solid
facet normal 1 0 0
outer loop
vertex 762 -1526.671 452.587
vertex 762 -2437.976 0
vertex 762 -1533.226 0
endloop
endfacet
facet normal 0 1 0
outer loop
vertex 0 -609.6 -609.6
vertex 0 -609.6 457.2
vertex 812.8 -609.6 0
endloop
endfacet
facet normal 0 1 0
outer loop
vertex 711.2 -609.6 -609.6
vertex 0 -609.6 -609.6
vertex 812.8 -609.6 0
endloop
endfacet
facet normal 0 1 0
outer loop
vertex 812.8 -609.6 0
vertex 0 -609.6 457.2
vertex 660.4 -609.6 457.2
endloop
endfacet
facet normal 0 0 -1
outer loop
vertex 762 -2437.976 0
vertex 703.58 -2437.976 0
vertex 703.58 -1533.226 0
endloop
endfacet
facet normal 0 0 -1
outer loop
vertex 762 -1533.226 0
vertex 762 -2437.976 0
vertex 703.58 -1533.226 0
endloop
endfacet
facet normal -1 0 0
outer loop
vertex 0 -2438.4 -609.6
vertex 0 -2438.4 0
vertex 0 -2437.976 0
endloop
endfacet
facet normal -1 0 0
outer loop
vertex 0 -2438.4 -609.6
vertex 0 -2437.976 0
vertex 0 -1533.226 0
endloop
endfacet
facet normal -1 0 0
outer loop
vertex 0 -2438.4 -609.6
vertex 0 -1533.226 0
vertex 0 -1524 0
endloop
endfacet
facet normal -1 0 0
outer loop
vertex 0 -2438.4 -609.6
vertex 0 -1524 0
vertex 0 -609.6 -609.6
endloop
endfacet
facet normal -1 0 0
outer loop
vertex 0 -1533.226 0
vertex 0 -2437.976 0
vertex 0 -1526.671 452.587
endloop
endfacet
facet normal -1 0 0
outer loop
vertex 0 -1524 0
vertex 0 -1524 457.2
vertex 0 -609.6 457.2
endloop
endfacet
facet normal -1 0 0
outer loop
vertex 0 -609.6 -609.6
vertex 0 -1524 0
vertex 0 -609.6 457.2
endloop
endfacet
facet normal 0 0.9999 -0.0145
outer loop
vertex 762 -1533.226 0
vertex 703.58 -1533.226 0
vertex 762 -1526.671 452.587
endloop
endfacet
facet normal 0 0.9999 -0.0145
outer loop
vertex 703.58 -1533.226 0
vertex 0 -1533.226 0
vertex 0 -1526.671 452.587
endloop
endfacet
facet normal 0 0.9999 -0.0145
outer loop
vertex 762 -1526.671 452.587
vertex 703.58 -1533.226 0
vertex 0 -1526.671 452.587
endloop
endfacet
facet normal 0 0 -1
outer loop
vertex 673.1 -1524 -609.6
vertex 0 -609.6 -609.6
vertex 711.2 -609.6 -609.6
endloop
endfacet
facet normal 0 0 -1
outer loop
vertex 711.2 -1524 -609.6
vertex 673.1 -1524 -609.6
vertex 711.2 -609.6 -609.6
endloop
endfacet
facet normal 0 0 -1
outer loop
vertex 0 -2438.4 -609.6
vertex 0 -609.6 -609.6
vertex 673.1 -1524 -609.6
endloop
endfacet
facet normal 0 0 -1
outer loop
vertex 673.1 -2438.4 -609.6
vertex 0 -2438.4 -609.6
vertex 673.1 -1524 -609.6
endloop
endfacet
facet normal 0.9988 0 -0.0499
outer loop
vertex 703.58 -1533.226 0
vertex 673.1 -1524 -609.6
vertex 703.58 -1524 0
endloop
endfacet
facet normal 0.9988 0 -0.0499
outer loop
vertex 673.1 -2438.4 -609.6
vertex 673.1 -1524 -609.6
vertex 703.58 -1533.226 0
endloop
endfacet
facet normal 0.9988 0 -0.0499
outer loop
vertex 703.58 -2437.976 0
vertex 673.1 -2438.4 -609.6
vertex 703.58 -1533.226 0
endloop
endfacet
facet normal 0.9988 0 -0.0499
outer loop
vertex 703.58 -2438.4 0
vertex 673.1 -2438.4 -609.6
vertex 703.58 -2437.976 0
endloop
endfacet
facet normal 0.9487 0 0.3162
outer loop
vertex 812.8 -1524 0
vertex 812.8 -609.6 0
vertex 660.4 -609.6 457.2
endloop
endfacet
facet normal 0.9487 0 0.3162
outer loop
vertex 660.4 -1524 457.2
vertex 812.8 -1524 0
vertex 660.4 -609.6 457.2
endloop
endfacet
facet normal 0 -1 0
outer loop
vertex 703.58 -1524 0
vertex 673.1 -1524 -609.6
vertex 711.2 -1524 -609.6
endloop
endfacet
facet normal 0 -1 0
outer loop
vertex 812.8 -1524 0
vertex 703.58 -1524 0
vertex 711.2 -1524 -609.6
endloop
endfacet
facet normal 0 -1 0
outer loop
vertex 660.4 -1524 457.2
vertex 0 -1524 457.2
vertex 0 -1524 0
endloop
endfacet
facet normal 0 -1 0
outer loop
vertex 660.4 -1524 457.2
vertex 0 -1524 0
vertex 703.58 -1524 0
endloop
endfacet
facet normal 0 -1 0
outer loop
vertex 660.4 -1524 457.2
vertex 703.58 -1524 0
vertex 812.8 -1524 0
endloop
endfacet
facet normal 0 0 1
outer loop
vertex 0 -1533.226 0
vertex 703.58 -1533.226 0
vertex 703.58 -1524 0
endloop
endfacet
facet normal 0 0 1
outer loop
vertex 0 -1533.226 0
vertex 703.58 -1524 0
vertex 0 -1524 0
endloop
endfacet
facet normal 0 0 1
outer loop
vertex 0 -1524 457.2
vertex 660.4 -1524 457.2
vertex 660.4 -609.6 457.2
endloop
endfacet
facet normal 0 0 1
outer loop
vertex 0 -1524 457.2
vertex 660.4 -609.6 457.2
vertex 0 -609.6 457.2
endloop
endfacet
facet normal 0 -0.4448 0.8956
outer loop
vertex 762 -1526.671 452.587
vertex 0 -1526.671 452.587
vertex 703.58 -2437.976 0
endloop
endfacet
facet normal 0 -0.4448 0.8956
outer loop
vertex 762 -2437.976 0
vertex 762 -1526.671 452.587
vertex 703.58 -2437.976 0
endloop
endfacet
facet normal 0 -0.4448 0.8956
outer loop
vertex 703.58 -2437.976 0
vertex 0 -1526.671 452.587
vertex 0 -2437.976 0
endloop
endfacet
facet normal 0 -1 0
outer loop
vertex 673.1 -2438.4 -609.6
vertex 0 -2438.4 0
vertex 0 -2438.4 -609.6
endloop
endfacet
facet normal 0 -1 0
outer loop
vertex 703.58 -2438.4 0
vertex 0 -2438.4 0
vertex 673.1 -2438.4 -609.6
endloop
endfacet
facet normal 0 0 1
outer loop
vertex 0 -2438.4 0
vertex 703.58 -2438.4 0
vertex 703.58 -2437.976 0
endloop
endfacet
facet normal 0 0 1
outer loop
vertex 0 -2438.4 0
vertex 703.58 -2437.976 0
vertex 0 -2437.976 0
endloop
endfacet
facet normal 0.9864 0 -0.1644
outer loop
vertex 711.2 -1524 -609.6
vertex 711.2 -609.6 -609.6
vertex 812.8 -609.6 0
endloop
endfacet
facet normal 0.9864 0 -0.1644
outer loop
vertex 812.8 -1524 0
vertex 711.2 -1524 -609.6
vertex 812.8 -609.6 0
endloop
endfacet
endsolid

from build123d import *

# Parameters (mm, degrees)
F12_DEPTH = 914.4
F13_DEPTH = 914.4
F14_DEPTH = 762
F15_DEPTH = 914.4


with BuildPart() as f12:
    # F8 (on offset) → F12 (new body, through all)
    with BuildSketch(Plane.XZ.offset(2438.4)):
        Polygon((673.1, -609.6), (703.58, 0), (0, 0), (0, -609.6), align=None)
    extrude(amount=-F12_DEPTH)

    # F10 (on offset) → F13 (join, through all)
    with BuildSketch(Plane.XZ.offset(1524)):
        Polygon((0, 457.2), (0, 0), (673.1, 0), (584.2, 457.2), align=None)
        Polygon((673.1, 0), (0, 0), (0, -609.6), (609.6, -609.6), align=None)
    extrude(amount=-F13_DEPTH)

    # F11 (on Right) → F14 (join)
    with BuildSketch(Plane.YZ):
        Polygon((-1526.670575, 452.586561), (-2437.97636, 0), (-1533.226132, 0), align=None)
    extrude(amount=F14_DEPTH)

    # F9 (on offset) → F15 (join)
    with BuildSketch(Plane.XZ.offset(609.6)):
        Polygon((0, 457.2), (0, 0), (812.8, 0), (660.4, 457.2), align=None)
        Polygon((812.8, 0), (0, 0), (0, -609.6), (711.2, -609.6), align=None)
    extrude(amount=F15_DEPTH)


solid = f12.part
